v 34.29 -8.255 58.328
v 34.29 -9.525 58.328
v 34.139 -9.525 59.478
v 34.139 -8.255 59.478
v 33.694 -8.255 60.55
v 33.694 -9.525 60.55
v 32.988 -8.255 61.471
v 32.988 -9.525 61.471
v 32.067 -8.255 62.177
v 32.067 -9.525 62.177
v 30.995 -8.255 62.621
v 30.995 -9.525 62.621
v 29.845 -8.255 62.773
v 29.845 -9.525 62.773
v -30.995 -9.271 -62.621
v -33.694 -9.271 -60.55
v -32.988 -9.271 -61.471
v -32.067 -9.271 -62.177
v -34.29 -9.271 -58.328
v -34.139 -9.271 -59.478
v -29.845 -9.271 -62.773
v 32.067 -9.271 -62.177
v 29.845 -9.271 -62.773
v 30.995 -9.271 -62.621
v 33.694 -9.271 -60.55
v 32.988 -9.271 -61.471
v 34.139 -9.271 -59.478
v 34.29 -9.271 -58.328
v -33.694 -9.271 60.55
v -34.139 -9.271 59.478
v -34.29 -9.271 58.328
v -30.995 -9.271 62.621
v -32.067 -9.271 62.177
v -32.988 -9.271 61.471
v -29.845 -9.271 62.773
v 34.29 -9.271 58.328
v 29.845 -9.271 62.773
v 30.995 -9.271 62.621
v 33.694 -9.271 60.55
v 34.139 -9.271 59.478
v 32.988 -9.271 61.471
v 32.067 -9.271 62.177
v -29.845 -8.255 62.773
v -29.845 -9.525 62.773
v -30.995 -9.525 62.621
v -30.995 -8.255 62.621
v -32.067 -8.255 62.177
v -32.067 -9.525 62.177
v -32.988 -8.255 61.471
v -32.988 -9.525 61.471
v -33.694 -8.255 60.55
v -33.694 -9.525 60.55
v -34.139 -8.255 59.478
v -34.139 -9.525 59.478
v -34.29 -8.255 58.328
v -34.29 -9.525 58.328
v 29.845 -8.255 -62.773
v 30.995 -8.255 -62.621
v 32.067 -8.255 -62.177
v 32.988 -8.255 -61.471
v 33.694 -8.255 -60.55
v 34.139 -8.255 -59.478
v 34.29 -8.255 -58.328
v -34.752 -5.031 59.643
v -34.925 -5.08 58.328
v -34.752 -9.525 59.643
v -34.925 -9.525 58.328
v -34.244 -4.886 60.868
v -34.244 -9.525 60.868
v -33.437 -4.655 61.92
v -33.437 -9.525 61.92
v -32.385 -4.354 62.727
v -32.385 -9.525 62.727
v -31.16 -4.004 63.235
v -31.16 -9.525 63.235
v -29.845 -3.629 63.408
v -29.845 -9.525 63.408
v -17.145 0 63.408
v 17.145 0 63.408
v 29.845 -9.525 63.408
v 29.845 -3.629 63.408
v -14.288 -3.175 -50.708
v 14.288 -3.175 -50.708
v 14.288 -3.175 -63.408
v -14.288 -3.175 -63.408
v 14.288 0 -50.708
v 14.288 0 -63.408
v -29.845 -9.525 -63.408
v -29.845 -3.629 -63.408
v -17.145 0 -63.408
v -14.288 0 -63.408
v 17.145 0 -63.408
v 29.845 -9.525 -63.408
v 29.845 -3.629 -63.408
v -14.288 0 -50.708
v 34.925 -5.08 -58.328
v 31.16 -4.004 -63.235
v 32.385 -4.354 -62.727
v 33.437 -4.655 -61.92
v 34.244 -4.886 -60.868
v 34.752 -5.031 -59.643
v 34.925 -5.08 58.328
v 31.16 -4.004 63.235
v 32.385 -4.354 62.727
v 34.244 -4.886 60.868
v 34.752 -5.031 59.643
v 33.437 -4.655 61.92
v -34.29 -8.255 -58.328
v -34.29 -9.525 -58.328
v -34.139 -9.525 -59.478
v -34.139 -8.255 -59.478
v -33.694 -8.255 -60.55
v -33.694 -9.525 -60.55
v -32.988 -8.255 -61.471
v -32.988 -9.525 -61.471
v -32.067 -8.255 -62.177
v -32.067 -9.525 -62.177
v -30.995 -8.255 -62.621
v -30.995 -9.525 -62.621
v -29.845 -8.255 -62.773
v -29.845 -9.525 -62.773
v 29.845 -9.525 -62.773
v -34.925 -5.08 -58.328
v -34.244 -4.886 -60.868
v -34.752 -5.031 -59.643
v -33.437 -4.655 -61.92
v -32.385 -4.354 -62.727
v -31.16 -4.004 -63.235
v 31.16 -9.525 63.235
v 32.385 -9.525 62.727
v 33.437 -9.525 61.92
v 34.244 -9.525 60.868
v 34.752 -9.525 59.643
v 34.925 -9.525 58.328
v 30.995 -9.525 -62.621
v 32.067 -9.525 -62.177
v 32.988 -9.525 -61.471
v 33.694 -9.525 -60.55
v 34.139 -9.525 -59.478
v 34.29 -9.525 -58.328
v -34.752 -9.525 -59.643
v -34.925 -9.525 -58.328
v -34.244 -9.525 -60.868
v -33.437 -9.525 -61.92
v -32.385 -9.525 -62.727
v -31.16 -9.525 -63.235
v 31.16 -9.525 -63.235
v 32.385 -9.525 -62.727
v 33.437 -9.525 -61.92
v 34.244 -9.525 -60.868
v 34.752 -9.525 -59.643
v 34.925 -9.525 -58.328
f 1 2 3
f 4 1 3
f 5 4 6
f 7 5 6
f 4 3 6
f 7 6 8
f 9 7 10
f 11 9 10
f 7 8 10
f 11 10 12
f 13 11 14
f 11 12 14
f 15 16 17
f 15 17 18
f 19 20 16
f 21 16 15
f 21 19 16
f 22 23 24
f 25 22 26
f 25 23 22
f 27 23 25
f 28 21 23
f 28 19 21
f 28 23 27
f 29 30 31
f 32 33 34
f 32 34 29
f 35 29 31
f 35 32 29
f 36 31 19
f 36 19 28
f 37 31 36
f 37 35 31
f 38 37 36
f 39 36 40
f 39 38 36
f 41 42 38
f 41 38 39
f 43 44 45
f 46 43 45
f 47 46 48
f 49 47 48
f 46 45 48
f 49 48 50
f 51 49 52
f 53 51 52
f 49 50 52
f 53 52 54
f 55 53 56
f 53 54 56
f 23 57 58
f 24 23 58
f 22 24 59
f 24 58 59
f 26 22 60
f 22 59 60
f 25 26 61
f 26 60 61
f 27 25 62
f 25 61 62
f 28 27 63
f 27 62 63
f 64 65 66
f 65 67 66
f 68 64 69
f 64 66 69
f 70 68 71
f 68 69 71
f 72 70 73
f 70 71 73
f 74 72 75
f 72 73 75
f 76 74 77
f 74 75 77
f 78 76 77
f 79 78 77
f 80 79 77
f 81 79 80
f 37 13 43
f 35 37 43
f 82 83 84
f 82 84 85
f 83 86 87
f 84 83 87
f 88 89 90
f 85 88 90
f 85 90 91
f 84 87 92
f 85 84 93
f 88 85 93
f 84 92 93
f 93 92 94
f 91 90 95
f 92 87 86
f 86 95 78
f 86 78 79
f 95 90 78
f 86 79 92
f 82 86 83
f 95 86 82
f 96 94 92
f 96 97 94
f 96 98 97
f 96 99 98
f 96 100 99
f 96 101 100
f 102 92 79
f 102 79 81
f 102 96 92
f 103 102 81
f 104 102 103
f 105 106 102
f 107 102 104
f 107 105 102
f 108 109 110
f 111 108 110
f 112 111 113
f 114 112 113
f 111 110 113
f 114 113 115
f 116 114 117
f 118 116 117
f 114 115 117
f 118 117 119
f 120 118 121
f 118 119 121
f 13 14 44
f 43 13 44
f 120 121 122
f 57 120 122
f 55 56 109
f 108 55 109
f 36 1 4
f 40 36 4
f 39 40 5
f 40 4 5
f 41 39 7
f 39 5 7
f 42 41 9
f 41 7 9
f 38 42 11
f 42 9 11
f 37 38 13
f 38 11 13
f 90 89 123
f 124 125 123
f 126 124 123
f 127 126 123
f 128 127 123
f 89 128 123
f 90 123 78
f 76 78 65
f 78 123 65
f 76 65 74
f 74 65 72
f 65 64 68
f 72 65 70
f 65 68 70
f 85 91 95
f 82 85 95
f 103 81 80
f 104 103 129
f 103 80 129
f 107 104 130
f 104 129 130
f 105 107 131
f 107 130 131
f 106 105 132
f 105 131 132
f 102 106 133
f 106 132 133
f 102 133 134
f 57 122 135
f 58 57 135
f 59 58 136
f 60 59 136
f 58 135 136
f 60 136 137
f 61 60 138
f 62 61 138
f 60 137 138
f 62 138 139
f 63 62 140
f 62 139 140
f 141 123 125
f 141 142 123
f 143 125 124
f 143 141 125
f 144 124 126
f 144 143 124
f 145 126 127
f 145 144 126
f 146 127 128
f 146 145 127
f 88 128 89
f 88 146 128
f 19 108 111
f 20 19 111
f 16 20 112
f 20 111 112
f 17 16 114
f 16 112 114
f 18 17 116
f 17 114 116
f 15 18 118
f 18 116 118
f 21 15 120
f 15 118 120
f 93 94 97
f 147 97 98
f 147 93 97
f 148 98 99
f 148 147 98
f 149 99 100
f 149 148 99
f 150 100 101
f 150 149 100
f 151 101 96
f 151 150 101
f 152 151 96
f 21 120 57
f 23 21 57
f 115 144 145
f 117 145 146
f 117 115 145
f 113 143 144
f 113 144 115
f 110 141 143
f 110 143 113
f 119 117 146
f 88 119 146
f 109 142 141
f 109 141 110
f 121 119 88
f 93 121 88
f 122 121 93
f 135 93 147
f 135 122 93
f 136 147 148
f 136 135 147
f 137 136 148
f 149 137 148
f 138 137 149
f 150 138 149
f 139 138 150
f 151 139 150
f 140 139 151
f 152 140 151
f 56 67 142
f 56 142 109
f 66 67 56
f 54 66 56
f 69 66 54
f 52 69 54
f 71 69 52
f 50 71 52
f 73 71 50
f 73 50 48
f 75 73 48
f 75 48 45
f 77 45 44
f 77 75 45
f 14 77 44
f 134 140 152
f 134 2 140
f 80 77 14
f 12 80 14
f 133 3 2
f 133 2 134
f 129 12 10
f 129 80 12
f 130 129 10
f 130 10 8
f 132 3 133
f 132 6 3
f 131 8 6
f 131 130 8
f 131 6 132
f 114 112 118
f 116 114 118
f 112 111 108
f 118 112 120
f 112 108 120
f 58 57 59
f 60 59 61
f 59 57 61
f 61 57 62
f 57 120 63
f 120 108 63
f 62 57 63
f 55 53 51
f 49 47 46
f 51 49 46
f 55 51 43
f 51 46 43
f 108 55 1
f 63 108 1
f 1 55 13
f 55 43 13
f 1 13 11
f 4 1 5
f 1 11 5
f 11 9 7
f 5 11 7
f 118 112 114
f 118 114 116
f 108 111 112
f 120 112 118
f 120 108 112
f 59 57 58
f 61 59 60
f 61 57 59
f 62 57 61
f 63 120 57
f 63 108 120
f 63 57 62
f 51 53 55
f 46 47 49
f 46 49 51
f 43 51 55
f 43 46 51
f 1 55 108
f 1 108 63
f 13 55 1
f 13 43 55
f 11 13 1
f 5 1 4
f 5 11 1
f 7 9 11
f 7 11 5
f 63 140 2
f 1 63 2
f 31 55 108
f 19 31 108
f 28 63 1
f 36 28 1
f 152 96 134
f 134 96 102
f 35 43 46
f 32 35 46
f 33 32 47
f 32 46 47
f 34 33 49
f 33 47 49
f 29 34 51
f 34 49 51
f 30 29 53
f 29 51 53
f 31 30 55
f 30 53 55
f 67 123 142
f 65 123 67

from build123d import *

# Parameters (mm, degrees)
F0_W     = 69.85
F0_H     = 126.8157162973
F1_DEPTH = 9.525
F2_SIZE2 = 5.08
F2_SIZE  = 17.78
F3_R     = 5.08
F5_DEPTH = 1.27
F6_DEPTH = 1.016
F7_W     = 28.575
F7_H     = 12.7
F8_DEPTH = 3.175


with BuildPart() as f1:
    # F0 (on Front) → F1 (new body)
    with BuildSketch(Plane.XZ):
        Rectangle(F0_W, F0_H)
    extrude(amount=F1_DEPTH)

    # F2
    f2_edges = [f1.edges().sort_by_distance(p)[0] for p in [
        (34.925, 0, 0),
        (-34.925, 0, 0),
    ]]
    f2_side = f1.faces().sort_by_distance((0, 0, 0))[0]
    chamfer(f2_edges, length=F2_SIZE, length2=F2_SIZE2, reference=f2_side)

    # F3
    f3_edges = [f1.edges().sort_by_distance(p)[0] for p in [
        (34.925, -7.3025, 63.407858),
        (-34.925, -7.3025, 63.407858),
        (-34.925, -7.3025, -63.407858),
        (34.925, -7.3025, -63.407858),
    ]]
    fillet(f3_edges, radius=F3_R)

    # F4 (on face) → F5 (cut)
    with BuildSketch(Plane.XZ.offset(9.525)):
        with BuildLine():
            Line((-29.845, -62.7728581487), (29.845, -62.7728581487))
            ThreePointArc((29.845, -62.7728581487), (32.9880896424, -61.470947791), (34.29, -58.3278581487))
            Line((34.29, -58.3278581487), (34.29, 58.3278581487))
            ThreePointArc((34.29, 58.3278581487), (32.9880896424, 61.470947791), (29.845, 62.7728581487))
            Line((29.845, 62.7728581487), (-29.845, 62.7728581487))
            ThreePointArc((-29.845, 62.7728581487), (-32.9880896424, 61.470947791), (-34.29, 58.3278581487))
            Line((-34.29, 58.3278581487), (-34.29, -58.3278581487))
            ThreePointArc((-34.29, -58.3278581487), (-32.9880896424, -61.470947791), (-29.845, -62.7728581487))
        make_face()
    extrude(amount=-F5_DEPTH, mode=Mode.SUBTRACT)


with BuildPart() as f6:
    # F6 (new): a face of the model
    f6_faces = [f1.part.faces().sort_by_distance(p)[0] for p in [
        (0, -8.255, 0),
    ]]
    extrude(f6_faces, amount=F6_DEPTH)


with BuildPart() as f1_1:
    add(f1.part)

    # F7 (on face) → F8 (cut)
    with BuildSketch(Plane(origin=(0, 0, 0), x_dir=(-1, 0, 0), z_dir=(0, 1, 0))):
        with Locations((0, -69.7578581487)):
            Rectangle(F7_W, F7_H)
        with Locations((0, -57.0578581487)):
            Rectangle(F7_W, F7_H)
    extrude(amount=-F8_DEPTH, mode=Mode.SUBTRACT)


solid = Compound([f6.part, f1_1.part])
